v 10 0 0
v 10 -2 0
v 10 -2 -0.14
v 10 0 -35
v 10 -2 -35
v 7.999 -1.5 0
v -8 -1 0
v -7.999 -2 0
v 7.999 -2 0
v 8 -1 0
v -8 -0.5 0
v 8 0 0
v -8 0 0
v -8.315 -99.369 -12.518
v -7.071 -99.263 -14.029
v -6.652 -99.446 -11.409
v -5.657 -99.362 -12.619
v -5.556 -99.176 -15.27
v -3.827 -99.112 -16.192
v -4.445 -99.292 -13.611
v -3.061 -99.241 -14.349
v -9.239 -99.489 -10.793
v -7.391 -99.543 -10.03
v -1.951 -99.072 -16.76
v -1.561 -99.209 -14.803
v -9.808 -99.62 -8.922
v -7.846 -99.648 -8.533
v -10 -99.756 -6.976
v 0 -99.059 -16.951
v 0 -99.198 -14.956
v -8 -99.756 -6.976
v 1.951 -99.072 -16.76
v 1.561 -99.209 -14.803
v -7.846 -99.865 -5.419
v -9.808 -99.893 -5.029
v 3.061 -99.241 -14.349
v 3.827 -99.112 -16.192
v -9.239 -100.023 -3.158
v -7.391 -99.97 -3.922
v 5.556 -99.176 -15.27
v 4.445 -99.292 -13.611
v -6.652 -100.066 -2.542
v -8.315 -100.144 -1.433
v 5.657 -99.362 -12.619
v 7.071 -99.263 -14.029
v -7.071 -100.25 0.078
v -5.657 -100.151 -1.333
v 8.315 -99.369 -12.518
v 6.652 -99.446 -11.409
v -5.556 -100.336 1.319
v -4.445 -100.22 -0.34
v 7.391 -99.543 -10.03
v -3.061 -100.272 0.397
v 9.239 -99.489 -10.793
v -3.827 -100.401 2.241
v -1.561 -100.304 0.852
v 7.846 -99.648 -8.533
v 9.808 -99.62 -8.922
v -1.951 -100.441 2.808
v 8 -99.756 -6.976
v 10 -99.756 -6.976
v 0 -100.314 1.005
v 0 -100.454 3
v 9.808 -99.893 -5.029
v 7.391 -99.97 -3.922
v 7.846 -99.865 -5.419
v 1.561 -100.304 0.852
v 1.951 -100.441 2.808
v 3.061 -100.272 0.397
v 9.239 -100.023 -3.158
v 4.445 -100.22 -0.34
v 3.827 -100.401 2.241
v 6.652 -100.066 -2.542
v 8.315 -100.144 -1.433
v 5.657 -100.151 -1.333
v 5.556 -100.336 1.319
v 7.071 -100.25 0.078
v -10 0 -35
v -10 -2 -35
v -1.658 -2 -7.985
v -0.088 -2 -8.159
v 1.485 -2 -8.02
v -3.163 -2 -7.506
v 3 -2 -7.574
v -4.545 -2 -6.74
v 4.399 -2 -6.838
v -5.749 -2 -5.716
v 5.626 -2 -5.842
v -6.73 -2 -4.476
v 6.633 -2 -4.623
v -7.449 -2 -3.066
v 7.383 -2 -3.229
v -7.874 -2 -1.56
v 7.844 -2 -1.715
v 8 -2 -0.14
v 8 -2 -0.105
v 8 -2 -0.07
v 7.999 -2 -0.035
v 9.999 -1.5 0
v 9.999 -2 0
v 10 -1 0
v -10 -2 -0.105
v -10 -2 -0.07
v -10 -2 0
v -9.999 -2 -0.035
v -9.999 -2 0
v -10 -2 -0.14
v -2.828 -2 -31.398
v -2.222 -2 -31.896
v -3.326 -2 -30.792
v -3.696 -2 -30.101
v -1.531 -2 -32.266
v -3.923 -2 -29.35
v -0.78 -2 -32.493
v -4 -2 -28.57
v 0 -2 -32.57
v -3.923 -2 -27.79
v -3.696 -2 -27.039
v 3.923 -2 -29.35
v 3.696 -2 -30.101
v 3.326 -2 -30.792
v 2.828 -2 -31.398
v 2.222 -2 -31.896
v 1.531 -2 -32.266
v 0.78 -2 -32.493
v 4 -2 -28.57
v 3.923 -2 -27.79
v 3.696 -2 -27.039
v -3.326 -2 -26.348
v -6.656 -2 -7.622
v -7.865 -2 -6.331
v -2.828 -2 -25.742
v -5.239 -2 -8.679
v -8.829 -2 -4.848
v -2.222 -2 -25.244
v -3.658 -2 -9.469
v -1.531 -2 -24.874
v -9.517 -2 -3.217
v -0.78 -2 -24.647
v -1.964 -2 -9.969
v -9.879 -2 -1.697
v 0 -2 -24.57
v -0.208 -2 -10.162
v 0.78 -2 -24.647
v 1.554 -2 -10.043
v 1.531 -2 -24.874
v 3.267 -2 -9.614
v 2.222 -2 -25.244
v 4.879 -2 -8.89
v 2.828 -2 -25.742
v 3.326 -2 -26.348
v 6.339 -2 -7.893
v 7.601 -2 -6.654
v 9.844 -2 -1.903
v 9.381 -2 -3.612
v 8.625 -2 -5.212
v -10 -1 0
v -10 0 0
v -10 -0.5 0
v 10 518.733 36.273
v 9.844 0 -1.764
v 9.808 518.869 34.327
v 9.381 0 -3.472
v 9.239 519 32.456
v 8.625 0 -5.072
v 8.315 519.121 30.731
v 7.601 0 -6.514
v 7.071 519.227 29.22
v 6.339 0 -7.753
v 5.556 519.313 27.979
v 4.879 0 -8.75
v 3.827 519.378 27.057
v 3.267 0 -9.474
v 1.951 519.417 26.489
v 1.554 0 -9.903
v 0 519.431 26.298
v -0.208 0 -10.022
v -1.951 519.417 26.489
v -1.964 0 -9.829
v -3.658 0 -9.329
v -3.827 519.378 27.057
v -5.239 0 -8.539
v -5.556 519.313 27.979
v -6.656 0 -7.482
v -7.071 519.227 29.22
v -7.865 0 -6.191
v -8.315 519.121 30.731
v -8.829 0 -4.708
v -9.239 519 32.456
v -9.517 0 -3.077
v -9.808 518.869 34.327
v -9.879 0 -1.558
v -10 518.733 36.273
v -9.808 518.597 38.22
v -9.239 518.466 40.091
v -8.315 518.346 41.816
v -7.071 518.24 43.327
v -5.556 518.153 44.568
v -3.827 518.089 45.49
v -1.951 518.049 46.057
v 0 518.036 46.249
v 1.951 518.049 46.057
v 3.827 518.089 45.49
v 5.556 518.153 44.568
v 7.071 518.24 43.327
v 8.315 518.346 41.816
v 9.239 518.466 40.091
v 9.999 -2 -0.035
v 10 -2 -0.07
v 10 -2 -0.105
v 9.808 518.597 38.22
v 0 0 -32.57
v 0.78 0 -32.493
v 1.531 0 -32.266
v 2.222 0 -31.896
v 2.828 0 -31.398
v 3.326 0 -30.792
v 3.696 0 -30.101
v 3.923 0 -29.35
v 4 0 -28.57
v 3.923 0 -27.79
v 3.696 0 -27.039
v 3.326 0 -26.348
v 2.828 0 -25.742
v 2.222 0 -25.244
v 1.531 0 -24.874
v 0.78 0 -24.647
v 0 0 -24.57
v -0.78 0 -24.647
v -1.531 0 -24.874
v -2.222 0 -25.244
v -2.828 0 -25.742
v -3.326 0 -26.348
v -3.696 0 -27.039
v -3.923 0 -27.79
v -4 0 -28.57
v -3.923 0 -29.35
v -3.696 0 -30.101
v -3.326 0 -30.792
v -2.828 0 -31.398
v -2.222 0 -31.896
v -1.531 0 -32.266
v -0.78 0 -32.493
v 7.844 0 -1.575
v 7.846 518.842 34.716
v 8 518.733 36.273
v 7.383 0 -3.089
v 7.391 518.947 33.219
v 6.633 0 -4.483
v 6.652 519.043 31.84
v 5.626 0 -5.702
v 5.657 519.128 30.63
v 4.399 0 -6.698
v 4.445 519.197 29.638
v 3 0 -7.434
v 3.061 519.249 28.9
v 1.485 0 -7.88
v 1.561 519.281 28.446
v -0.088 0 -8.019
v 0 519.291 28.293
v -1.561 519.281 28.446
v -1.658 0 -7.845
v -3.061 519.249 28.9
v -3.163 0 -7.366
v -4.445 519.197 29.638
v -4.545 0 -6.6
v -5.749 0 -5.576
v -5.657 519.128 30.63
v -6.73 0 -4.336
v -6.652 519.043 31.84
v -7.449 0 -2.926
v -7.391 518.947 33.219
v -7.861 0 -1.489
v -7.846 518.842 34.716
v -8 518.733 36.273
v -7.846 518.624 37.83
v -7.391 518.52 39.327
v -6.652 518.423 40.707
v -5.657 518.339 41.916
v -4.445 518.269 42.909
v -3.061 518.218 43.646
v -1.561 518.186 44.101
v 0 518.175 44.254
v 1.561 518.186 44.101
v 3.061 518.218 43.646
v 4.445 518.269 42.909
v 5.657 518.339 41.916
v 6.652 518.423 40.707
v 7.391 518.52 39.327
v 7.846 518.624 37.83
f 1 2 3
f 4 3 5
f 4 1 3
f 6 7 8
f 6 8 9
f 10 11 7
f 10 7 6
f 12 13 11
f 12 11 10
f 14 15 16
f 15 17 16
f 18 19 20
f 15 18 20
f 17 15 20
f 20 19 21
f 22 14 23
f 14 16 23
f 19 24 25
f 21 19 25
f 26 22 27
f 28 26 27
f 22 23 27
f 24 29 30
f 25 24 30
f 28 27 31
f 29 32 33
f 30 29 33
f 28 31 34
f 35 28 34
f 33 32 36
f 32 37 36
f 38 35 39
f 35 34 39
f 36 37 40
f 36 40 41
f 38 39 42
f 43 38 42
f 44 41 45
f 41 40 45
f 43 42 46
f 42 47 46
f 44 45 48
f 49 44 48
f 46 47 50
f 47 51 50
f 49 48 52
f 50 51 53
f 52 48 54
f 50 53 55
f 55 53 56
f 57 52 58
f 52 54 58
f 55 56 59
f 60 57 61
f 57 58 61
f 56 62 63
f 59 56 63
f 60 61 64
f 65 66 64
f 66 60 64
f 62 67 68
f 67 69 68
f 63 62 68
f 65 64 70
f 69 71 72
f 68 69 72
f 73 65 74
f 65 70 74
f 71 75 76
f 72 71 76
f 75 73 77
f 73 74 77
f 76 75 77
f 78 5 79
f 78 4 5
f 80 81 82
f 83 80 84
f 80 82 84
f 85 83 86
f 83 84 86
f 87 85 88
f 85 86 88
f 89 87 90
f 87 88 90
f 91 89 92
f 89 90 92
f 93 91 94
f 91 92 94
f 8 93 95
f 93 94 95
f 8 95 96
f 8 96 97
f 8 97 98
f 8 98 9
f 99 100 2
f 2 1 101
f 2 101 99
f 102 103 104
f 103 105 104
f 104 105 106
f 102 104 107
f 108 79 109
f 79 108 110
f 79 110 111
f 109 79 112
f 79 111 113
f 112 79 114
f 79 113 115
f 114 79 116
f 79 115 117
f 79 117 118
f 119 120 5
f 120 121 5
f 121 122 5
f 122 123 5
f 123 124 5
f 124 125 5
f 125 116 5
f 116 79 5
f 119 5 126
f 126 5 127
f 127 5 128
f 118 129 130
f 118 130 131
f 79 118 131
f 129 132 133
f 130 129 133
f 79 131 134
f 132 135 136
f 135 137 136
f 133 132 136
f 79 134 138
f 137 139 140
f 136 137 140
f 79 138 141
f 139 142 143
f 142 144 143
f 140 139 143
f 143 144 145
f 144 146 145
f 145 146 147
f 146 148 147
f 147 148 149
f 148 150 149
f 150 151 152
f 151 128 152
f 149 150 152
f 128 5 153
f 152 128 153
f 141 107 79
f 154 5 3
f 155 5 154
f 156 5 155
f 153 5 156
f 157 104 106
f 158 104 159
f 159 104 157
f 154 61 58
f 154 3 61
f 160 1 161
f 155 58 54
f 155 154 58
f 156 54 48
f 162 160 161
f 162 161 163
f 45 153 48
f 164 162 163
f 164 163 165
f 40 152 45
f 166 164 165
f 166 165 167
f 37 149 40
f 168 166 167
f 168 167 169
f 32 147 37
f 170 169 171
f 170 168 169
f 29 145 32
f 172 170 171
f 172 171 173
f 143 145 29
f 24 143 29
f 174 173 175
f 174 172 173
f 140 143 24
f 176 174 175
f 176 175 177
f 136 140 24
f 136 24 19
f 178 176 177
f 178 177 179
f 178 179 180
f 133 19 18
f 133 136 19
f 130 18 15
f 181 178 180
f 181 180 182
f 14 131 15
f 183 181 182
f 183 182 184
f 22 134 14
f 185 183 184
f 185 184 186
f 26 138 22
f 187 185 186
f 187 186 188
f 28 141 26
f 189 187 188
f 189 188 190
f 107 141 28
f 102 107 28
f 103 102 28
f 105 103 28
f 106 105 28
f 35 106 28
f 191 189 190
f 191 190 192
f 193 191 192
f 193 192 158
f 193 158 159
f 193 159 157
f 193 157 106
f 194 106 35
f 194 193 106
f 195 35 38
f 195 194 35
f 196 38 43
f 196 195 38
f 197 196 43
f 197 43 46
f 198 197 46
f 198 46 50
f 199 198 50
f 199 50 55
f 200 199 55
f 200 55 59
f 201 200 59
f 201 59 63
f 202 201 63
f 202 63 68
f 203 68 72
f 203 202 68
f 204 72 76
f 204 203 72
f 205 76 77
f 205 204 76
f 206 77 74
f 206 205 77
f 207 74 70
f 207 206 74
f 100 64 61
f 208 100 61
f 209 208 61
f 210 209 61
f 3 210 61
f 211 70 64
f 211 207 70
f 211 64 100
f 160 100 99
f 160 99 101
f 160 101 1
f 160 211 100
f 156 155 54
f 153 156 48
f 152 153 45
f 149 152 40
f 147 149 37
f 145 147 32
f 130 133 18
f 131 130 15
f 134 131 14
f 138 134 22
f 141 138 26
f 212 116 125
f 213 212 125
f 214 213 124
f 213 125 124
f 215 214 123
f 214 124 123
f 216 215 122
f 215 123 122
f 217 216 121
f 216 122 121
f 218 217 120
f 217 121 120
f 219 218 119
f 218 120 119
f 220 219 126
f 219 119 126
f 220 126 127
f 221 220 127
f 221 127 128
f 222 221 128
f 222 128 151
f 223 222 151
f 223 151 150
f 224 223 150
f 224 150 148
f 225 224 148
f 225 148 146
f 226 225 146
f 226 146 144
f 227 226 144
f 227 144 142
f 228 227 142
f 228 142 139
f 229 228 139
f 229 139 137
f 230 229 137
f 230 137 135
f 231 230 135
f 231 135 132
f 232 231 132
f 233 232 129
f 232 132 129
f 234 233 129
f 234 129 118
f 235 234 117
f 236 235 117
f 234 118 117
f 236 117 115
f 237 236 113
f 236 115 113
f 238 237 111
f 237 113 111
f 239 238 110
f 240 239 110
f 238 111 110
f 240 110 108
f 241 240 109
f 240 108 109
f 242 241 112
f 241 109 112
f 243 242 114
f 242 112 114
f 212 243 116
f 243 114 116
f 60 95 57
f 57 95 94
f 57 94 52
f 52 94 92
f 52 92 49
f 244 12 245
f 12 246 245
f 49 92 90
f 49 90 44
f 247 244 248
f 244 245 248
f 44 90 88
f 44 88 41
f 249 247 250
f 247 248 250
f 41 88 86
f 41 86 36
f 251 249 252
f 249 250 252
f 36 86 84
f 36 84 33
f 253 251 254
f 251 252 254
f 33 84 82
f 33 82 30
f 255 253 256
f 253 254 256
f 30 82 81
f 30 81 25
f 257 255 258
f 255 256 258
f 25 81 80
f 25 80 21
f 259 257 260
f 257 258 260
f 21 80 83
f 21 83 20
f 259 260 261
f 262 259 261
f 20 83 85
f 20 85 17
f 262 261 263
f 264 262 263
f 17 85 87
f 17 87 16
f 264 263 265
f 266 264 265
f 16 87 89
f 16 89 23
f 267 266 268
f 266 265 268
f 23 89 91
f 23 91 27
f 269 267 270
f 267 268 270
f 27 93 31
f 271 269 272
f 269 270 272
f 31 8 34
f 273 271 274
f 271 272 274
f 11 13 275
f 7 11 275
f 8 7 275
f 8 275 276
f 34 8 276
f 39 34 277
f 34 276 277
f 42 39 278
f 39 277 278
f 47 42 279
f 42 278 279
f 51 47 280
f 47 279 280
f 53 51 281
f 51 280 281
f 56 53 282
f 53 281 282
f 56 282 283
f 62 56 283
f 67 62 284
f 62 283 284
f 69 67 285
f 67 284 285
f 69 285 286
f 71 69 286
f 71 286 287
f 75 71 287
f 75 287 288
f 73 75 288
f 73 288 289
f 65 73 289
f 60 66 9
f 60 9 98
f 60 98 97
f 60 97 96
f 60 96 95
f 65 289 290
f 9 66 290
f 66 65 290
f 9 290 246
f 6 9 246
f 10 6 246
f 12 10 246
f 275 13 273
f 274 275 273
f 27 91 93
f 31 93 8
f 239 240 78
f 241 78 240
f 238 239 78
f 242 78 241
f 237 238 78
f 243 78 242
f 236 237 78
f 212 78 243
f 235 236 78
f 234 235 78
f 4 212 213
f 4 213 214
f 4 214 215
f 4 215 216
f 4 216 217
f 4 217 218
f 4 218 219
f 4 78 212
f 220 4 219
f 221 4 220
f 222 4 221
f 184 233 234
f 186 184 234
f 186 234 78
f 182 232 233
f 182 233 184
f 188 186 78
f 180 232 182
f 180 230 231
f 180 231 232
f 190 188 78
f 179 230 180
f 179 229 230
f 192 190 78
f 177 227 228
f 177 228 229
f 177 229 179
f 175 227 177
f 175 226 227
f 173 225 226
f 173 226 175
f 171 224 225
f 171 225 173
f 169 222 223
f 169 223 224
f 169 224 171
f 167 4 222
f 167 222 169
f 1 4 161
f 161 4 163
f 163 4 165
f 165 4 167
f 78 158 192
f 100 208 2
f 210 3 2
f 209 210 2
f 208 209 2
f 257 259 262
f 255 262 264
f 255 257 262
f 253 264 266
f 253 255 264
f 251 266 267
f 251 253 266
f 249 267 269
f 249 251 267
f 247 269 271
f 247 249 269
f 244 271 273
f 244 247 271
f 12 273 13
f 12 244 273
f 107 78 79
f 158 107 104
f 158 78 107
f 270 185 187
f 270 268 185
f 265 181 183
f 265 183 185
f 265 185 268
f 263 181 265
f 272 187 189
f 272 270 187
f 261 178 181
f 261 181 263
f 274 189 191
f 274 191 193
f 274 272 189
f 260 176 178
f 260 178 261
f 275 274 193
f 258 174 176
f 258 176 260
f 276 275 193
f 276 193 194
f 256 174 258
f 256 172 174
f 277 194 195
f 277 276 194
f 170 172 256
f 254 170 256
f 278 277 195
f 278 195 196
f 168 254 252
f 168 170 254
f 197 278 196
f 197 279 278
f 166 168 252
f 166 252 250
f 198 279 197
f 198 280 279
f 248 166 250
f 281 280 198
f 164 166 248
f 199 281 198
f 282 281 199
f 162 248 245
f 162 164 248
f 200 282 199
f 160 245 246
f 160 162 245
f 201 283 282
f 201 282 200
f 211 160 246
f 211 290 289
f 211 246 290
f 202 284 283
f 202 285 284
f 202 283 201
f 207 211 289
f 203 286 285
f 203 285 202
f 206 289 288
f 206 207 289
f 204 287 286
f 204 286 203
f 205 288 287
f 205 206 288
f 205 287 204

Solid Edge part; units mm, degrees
sketch "Sketch1" plane through (2.3093, -0.1611, 2.3037) normal (0, 0.9976, 0.0698) x (1, 0, 0)
  circle A0 centre (-2.3093, 2.3093) radius 10
  dimension "D1" = 20
extrude "ExtrudedProtrusion_2" add sketch "Sketch1" against normal blind 100 and the other way blind 520
shell "Thinwall_2" thickness 2 removed faces 2 at (-6.4667, -99.2774, -13.8256) at (-6.4667, 519.2123, 29.4235)
sketch "Sketch2" plane through (0, 0, 0) normal (0, -1, 0) x (1, 0, 0)
  line L0 (10, -35) -> (-10, -35)
  line L1 (-10, -35) -> (-10, 0)
  line L2 (-10, 0) -> (10, 0)
  line L3 (10, 0) -> (10, -35)
  dimension "D1" = 35
extrude "ExtrudedProtrusion_3" add sketch "Sketch2" along normal blind 2
hole "Hole_1" at (0, -2, -28.57) direction (0, 1, 0) diameter 8 end up to next
properties material "Aluminum, 1060"
